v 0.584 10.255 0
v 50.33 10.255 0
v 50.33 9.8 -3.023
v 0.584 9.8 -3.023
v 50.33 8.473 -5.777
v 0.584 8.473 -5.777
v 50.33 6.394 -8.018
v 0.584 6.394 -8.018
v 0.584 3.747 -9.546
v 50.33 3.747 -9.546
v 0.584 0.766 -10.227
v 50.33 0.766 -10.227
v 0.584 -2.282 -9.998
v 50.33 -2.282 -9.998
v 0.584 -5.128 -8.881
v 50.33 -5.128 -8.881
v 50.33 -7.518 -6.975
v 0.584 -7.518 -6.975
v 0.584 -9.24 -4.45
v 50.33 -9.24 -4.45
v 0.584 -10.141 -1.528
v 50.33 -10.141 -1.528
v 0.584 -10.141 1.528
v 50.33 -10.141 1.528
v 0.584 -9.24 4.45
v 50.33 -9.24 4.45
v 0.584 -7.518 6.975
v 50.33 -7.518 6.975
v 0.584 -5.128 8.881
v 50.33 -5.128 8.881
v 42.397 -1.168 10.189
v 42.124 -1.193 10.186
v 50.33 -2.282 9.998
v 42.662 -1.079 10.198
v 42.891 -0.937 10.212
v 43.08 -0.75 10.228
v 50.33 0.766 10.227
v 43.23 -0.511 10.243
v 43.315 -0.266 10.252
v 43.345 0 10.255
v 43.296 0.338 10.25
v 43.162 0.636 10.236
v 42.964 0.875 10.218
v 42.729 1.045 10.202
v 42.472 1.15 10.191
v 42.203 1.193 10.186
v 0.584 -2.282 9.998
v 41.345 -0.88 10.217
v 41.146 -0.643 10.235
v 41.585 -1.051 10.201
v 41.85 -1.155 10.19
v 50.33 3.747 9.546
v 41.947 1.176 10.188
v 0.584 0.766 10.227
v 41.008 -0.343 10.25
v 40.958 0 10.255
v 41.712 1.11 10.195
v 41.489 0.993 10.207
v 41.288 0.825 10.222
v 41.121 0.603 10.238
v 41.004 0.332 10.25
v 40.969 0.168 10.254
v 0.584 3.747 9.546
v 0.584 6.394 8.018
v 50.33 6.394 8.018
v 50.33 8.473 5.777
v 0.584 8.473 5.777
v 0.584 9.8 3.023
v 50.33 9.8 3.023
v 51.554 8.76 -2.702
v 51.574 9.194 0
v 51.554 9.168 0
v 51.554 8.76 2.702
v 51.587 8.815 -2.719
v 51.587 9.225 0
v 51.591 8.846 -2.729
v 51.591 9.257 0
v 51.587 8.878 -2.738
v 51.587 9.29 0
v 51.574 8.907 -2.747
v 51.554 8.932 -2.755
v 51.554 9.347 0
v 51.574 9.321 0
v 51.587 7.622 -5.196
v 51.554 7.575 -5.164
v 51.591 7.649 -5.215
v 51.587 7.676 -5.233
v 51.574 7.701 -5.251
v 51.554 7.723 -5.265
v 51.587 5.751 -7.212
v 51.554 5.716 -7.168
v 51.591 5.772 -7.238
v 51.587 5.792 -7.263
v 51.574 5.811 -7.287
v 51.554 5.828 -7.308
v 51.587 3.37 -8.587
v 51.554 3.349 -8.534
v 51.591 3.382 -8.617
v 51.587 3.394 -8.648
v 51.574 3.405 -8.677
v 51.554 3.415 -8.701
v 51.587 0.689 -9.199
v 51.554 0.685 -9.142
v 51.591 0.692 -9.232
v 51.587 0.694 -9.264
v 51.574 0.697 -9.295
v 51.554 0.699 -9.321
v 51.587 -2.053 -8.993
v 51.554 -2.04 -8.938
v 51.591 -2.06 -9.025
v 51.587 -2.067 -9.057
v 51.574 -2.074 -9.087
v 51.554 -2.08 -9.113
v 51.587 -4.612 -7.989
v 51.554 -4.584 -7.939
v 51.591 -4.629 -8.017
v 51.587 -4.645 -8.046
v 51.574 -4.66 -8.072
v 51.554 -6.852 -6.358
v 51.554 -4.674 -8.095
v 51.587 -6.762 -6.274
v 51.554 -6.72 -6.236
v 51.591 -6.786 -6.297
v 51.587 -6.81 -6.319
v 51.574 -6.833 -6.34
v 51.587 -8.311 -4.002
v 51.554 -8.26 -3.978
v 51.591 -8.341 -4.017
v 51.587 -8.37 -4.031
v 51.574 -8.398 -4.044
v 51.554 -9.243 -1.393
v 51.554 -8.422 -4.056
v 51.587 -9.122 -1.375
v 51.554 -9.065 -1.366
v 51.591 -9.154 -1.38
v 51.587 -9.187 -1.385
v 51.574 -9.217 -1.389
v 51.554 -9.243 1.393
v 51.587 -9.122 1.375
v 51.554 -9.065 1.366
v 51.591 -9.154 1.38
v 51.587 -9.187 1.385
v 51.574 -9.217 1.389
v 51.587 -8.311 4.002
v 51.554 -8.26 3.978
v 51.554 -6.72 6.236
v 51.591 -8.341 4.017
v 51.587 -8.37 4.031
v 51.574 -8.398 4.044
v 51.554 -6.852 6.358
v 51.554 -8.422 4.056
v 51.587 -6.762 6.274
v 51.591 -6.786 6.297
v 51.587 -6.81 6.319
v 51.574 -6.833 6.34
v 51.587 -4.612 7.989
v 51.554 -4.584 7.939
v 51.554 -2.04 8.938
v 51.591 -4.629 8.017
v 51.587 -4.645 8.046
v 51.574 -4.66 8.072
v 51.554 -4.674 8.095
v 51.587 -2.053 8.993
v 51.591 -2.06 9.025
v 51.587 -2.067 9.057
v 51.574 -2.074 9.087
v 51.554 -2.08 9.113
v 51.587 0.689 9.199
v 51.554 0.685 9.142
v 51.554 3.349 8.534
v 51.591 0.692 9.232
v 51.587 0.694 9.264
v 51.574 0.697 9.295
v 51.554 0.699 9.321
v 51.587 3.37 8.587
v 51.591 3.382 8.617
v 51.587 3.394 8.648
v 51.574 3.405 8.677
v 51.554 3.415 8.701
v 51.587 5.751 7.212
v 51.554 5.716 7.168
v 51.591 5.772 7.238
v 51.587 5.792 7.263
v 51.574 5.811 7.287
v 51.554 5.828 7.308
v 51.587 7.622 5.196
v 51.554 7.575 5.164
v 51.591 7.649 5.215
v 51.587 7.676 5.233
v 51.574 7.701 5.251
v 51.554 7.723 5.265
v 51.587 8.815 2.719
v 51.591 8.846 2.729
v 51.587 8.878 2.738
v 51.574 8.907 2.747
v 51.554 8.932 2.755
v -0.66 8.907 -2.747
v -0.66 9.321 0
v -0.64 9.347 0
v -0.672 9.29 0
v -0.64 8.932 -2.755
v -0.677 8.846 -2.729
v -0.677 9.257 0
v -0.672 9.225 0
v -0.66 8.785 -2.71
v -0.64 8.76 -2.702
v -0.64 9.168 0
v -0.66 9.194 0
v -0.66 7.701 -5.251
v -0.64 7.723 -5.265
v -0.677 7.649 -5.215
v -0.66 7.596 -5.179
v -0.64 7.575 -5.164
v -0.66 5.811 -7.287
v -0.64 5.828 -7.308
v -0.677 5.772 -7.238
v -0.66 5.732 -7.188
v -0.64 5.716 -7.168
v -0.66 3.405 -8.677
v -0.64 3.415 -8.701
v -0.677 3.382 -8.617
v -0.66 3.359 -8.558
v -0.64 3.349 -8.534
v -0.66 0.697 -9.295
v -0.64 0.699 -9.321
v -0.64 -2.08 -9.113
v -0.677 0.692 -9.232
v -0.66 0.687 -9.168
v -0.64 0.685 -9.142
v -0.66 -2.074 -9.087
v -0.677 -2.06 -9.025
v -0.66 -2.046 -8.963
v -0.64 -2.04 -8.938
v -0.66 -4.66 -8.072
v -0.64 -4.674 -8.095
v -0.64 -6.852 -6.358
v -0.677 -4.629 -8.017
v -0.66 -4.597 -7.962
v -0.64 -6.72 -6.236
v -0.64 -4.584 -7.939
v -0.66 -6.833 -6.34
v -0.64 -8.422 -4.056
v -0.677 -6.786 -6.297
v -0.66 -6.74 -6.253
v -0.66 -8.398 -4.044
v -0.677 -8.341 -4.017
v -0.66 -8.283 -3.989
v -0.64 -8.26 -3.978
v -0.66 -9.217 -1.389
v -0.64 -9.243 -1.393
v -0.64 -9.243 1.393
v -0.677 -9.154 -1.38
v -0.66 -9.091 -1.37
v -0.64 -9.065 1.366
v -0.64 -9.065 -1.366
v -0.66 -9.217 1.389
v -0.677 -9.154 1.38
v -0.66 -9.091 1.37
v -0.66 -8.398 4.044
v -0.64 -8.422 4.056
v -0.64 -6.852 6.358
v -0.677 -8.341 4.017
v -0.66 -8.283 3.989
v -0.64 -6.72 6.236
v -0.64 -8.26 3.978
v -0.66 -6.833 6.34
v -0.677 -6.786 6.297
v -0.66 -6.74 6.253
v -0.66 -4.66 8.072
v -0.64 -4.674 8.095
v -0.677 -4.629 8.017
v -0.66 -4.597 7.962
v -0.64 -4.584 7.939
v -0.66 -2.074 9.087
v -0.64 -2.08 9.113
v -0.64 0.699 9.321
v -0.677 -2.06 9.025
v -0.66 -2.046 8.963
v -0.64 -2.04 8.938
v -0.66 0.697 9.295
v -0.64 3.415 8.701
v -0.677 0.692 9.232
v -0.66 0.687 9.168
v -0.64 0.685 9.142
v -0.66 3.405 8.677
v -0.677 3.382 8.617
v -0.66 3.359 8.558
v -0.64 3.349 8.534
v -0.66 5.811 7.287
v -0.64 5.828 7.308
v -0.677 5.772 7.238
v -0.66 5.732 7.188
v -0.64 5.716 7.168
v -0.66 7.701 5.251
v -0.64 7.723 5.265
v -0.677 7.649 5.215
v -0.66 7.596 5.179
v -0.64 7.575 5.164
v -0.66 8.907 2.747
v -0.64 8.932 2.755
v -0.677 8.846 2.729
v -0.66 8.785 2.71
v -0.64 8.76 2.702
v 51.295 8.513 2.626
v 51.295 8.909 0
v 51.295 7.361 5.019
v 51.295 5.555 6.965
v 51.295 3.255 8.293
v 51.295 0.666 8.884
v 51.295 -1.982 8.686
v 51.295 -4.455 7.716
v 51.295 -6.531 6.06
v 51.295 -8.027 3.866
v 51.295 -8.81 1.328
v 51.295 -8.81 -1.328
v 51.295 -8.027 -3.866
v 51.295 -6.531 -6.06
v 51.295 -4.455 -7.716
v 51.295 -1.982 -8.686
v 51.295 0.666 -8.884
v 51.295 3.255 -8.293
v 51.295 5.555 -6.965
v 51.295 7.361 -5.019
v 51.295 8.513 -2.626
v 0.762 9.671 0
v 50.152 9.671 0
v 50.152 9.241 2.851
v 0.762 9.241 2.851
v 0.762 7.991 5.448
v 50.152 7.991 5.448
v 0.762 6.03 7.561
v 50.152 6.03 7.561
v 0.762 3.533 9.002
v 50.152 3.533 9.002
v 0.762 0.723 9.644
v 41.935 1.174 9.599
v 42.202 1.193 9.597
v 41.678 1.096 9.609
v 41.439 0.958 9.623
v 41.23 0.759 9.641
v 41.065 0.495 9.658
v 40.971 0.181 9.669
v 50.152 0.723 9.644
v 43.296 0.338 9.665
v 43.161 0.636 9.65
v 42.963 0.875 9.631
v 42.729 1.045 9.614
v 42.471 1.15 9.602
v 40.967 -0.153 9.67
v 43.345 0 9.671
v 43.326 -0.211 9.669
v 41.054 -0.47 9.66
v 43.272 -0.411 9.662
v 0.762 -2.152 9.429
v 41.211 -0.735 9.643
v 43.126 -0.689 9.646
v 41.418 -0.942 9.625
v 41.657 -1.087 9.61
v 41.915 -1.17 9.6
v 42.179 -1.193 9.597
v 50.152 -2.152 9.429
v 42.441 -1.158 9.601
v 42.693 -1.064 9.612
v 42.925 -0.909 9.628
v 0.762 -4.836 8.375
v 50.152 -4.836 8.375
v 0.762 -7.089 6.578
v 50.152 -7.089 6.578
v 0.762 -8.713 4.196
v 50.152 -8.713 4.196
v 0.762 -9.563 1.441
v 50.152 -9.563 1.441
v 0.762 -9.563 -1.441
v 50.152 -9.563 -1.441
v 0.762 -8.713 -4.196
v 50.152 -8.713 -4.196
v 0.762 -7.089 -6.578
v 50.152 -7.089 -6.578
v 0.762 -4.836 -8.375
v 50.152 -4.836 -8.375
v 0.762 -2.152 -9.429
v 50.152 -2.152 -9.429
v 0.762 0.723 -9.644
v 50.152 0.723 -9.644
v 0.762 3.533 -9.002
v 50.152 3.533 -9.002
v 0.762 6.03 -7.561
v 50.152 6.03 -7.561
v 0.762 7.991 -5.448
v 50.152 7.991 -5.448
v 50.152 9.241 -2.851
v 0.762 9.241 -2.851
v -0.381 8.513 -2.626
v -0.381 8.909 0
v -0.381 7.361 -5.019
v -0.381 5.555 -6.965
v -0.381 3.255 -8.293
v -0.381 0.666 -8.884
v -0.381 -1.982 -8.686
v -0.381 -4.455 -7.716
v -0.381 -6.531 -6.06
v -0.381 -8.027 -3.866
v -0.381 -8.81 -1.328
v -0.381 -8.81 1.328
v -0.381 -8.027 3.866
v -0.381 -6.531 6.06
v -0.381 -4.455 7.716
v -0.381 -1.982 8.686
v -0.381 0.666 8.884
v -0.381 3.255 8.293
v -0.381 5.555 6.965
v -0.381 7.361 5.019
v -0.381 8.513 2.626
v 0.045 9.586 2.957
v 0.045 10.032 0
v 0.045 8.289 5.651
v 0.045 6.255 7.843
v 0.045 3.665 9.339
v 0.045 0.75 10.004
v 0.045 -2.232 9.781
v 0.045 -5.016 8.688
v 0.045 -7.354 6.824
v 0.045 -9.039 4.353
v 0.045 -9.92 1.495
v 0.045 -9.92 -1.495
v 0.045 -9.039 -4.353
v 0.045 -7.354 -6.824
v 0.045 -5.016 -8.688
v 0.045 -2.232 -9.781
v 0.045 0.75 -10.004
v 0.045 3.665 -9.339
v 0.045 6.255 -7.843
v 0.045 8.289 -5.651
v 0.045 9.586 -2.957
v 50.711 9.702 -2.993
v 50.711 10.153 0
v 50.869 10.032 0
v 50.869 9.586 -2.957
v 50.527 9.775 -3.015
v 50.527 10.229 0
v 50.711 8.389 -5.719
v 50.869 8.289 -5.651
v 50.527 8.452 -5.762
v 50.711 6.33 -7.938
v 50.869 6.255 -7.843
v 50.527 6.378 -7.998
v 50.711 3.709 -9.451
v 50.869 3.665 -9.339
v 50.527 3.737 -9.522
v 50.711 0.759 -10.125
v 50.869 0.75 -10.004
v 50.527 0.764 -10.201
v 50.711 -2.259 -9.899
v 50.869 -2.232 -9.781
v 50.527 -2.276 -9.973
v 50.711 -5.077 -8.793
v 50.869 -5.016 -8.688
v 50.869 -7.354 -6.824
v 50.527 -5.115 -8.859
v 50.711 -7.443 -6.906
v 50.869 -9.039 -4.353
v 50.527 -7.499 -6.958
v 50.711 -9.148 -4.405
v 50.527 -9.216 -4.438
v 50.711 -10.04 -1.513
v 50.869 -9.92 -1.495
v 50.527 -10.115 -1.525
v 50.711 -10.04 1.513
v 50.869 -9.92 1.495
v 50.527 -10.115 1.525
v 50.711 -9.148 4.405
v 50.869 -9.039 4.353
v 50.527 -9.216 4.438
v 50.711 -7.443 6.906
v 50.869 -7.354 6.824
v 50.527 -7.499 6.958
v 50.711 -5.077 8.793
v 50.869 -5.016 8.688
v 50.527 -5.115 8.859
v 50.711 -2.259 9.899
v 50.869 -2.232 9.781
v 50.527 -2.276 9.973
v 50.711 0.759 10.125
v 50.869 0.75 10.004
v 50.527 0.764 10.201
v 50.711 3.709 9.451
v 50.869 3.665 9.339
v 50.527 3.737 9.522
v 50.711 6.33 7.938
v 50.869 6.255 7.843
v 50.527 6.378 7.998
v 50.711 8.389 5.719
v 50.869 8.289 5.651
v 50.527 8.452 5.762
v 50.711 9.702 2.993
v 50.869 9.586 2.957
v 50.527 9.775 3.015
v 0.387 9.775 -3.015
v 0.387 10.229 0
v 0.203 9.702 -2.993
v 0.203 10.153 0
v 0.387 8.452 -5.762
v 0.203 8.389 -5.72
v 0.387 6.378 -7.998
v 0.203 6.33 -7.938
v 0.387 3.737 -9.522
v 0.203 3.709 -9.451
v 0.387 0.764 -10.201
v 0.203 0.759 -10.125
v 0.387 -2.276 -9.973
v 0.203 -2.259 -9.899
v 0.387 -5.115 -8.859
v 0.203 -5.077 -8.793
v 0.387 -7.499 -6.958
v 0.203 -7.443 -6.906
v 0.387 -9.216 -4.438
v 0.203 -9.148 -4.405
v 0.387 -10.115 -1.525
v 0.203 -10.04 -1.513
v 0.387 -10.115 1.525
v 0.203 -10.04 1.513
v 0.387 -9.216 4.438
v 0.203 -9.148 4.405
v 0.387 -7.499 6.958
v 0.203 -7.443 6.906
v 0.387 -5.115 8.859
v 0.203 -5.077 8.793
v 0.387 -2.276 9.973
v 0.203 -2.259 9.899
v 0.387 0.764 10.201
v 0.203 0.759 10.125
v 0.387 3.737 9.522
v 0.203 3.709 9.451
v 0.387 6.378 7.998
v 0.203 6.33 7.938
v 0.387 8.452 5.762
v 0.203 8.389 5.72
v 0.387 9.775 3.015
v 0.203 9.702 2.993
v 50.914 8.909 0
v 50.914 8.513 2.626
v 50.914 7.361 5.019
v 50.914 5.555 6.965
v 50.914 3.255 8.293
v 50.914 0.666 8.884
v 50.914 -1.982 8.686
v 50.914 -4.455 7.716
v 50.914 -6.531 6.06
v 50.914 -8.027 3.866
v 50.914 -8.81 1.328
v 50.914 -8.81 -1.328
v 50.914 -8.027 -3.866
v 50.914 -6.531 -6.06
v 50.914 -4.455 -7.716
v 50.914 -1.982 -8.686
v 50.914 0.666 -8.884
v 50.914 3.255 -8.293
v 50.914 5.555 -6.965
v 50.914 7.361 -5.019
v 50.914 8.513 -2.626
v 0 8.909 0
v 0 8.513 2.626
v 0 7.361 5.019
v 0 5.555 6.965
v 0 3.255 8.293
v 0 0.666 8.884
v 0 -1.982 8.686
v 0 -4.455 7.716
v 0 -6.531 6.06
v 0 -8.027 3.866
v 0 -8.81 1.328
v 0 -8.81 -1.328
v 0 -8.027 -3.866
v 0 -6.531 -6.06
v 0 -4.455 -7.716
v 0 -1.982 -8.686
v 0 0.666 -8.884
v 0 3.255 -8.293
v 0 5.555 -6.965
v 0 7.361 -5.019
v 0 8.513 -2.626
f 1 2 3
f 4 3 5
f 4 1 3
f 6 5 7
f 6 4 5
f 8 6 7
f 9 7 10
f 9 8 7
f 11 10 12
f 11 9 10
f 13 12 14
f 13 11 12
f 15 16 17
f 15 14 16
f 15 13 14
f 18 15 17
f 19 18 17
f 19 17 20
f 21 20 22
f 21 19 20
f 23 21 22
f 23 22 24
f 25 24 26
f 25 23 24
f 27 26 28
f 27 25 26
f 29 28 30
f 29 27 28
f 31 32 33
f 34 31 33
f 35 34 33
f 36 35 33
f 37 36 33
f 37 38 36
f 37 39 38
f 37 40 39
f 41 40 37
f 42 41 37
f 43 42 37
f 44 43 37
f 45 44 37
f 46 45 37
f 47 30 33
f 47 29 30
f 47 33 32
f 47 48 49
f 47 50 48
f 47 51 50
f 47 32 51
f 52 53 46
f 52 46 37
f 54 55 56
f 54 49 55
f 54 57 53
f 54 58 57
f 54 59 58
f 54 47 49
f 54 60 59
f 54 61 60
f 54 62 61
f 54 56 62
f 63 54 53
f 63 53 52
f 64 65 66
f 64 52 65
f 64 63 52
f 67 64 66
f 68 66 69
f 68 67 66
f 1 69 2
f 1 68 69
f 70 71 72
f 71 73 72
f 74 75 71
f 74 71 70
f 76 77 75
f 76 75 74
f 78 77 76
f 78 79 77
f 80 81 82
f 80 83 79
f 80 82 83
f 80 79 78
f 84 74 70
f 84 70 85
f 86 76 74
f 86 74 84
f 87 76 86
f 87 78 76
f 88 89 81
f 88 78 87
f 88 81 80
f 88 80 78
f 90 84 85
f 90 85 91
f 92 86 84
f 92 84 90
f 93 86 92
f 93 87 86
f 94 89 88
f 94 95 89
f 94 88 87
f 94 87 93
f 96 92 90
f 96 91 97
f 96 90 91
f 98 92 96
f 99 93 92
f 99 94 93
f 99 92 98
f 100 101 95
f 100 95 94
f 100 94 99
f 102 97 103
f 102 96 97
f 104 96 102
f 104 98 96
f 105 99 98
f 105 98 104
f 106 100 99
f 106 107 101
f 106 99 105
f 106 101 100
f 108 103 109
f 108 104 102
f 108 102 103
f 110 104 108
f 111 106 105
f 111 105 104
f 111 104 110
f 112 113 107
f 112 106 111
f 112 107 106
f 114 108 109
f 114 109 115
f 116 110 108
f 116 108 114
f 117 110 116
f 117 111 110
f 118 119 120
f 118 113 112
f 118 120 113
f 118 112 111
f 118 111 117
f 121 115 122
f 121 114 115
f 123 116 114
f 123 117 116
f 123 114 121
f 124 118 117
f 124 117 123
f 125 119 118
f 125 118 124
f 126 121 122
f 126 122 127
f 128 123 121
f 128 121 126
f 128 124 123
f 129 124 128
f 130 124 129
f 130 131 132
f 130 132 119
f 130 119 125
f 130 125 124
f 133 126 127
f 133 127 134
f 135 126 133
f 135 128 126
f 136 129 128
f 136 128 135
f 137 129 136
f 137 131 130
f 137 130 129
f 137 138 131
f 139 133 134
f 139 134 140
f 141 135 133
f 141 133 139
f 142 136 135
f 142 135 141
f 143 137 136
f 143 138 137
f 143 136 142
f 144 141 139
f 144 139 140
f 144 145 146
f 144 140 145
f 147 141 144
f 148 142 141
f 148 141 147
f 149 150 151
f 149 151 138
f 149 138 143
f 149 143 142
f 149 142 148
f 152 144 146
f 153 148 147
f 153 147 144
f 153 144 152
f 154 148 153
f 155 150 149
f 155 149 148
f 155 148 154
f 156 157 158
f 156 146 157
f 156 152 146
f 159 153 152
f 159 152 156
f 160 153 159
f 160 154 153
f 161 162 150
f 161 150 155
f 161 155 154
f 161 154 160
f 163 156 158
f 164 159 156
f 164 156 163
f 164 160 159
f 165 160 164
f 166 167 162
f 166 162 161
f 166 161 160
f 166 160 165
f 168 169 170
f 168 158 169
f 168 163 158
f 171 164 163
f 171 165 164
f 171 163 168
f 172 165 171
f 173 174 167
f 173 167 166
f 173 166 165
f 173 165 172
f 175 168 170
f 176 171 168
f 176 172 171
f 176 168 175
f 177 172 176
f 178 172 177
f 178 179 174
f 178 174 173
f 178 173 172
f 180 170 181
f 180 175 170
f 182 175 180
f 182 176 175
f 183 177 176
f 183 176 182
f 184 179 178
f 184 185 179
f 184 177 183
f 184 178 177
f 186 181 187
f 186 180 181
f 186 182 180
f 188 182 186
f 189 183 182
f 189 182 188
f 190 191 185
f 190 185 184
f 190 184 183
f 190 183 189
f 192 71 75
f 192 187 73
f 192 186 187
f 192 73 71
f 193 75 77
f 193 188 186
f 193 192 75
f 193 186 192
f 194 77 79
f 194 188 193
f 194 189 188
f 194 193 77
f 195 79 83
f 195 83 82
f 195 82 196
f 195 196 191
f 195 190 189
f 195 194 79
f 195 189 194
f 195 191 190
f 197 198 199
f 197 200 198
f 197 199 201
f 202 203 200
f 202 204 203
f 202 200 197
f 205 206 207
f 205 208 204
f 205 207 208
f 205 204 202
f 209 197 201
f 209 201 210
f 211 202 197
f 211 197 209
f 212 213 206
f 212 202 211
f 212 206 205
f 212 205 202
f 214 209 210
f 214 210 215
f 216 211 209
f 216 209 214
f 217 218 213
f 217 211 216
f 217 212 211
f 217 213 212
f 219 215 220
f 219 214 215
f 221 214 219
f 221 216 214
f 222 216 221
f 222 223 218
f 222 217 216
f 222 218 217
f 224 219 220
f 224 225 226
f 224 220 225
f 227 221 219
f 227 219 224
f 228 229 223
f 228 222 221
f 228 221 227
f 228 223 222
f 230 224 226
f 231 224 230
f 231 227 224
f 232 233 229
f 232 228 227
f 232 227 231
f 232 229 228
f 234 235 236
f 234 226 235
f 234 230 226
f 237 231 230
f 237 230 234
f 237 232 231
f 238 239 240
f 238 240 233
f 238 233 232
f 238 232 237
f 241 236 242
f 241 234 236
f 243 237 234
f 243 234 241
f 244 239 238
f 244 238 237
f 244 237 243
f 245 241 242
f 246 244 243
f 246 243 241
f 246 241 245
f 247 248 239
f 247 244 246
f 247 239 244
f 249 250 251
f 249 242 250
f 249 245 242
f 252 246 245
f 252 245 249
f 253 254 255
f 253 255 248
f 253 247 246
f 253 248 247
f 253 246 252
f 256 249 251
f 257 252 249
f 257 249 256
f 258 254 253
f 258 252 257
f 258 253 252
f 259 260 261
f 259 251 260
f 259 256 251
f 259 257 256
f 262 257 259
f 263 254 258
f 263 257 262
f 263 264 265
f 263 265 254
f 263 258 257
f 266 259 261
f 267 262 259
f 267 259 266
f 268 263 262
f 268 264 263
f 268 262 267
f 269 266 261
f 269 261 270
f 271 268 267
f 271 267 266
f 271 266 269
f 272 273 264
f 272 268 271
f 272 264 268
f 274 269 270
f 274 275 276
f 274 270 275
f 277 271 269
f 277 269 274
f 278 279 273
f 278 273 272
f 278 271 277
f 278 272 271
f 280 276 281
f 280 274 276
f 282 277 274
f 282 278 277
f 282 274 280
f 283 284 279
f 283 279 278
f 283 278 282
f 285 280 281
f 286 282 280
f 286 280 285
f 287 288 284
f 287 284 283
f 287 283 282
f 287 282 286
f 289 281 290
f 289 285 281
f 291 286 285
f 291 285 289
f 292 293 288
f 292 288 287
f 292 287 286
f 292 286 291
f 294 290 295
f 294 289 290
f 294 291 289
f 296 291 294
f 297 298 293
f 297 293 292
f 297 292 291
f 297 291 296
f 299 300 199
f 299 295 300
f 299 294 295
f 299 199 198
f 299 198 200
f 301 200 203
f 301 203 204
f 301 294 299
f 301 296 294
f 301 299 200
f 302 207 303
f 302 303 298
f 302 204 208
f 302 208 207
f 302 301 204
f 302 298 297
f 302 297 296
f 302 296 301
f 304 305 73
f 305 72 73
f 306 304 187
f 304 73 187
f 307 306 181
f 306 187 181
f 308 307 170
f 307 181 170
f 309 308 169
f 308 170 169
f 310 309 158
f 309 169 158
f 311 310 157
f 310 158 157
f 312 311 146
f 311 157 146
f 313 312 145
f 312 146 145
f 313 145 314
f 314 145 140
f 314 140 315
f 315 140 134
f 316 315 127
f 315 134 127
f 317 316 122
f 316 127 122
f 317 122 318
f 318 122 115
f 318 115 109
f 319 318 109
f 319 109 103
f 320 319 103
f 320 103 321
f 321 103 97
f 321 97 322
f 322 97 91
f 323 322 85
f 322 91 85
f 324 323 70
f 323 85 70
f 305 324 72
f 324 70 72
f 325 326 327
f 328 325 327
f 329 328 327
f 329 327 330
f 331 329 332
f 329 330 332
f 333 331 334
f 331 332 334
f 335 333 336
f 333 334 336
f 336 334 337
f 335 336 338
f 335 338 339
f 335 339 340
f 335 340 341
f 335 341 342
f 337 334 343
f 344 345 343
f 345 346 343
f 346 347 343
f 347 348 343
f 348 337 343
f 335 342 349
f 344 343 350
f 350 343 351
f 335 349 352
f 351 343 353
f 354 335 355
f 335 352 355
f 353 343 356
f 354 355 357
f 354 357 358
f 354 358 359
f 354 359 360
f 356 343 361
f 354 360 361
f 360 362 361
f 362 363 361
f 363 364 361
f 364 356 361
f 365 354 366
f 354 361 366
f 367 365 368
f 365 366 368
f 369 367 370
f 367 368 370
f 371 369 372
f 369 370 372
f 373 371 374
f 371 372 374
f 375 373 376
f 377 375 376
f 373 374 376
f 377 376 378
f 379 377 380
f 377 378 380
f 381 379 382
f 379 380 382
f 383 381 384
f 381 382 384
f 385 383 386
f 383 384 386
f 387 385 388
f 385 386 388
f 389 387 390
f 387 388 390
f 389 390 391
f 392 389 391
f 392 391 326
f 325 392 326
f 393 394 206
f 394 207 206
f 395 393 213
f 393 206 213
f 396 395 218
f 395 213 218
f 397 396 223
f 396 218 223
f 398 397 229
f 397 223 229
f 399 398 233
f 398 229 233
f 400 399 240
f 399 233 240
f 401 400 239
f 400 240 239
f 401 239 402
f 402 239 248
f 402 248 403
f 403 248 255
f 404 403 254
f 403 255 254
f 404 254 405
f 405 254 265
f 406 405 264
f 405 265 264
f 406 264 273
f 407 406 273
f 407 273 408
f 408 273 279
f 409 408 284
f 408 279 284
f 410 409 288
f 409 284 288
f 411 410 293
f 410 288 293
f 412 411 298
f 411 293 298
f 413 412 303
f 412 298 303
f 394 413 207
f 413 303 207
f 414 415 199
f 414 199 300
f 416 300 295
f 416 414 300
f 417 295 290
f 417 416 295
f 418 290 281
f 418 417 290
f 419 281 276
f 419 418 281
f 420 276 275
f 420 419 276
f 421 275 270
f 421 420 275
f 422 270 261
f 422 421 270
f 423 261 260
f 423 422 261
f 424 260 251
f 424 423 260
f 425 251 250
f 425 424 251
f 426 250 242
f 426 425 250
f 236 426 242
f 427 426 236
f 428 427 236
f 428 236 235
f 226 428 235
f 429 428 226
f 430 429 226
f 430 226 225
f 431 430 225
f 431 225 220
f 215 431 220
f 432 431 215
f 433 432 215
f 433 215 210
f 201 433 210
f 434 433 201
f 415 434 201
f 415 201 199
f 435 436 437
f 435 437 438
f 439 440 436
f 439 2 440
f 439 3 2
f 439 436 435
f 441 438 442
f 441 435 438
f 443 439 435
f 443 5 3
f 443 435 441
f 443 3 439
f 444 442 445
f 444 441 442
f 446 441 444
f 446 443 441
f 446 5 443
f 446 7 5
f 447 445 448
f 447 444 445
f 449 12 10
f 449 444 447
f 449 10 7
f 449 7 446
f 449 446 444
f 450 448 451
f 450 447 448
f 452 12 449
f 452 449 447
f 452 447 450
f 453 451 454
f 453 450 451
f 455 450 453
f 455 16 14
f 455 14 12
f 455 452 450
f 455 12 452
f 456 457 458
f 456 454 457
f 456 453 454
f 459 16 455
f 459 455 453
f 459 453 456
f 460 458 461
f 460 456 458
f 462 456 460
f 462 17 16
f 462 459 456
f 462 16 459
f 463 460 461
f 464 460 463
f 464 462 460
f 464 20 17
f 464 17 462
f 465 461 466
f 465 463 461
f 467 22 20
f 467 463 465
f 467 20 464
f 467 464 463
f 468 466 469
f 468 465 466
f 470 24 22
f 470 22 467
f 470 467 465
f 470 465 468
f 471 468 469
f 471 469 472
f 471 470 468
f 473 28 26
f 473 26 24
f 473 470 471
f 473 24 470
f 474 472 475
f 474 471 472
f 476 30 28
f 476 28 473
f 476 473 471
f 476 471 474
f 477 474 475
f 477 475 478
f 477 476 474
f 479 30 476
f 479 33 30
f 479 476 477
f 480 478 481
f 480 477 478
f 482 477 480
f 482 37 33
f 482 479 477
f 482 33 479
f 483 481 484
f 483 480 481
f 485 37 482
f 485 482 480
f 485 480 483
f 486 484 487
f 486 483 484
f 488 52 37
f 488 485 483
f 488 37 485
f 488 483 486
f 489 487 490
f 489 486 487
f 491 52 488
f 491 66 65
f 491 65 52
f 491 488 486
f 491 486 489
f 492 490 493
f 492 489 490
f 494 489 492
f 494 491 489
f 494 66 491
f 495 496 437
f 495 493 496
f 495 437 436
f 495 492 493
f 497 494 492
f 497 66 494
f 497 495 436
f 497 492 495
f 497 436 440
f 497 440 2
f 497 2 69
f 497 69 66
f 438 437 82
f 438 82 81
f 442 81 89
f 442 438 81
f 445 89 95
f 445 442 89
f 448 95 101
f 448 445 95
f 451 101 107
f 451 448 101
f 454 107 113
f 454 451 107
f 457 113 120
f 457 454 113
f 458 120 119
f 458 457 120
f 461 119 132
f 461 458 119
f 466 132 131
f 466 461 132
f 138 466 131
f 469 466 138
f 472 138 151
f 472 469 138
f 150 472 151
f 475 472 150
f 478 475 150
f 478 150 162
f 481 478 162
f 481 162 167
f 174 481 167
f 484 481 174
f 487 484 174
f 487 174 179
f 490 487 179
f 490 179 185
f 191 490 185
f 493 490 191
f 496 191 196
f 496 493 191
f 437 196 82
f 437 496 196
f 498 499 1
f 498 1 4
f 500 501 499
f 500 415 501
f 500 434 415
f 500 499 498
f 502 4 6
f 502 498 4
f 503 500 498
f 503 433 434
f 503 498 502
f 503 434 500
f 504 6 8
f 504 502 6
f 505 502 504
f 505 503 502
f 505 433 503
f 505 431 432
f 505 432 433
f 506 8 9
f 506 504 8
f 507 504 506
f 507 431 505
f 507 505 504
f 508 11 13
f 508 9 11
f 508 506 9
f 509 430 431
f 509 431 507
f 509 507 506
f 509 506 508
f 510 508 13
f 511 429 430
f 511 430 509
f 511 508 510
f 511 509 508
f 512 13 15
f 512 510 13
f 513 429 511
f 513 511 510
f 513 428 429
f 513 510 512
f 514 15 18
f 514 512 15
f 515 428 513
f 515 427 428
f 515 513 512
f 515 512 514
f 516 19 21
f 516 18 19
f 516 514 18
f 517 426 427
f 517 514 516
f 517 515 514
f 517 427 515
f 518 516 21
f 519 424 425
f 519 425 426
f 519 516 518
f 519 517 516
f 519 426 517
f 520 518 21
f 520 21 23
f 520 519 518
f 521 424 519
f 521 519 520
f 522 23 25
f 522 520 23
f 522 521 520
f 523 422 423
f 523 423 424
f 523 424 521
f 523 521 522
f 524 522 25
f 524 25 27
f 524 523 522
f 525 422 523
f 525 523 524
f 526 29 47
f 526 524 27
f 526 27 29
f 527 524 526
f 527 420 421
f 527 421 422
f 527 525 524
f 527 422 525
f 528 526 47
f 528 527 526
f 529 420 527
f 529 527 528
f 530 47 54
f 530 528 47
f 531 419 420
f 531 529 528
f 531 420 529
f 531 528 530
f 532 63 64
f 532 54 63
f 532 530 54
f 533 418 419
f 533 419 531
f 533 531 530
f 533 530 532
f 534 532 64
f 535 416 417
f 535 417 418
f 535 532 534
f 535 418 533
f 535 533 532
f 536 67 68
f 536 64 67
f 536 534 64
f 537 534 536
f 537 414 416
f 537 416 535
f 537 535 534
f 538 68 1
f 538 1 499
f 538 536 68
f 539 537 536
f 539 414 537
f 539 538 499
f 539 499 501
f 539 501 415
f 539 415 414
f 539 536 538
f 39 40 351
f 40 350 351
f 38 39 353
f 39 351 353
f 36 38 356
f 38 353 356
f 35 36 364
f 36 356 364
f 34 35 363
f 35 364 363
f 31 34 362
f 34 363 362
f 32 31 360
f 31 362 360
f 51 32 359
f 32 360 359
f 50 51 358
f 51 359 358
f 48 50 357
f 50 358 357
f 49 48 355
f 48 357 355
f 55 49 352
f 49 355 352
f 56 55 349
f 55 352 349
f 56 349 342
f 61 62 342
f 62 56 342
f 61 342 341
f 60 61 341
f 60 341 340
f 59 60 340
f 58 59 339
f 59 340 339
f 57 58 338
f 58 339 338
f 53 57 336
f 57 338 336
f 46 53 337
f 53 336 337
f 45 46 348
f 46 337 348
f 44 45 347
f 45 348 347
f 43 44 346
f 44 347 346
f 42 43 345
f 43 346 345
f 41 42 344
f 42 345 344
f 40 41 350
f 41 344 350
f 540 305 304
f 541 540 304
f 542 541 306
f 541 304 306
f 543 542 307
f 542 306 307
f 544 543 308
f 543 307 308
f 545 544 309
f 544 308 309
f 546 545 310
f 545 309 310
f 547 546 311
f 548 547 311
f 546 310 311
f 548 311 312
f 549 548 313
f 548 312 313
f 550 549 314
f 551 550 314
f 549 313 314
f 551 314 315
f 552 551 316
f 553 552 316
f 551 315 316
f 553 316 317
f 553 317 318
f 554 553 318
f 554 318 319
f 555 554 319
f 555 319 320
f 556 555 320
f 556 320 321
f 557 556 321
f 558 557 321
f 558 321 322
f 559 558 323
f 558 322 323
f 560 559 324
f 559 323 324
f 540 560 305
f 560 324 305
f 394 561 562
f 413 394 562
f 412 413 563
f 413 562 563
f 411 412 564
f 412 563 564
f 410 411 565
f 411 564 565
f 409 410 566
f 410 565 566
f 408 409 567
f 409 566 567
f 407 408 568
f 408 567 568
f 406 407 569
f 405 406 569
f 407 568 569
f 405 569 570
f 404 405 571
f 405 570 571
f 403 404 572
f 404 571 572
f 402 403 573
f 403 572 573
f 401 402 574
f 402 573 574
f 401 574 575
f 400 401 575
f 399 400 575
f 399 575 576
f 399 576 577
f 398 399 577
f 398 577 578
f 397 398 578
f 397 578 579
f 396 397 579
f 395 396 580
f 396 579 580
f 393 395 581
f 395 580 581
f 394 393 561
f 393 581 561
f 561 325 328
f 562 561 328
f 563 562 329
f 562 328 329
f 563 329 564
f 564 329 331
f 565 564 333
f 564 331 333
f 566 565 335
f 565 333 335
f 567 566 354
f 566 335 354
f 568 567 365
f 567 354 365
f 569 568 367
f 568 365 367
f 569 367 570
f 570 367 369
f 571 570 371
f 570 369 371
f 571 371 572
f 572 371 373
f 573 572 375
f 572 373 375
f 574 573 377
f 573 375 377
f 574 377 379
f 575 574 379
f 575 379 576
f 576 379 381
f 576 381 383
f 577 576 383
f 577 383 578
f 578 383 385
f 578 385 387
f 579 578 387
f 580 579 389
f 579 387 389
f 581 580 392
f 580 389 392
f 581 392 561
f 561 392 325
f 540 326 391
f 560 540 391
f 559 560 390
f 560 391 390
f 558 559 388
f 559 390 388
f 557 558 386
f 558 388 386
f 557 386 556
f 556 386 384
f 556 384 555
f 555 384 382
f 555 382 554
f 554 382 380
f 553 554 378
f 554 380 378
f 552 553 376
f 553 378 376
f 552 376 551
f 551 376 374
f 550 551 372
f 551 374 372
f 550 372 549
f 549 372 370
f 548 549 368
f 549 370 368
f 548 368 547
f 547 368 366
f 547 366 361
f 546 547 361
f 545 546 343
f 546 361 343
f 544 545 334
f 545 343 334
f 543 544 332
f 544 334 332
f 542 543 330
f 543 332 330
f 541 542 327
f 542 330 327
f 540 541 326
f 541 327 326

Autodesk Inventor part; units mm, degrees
sketch "Sketch_1" plane through (0, 0, 0) normal (0, 0, 1) x (1, 0, 0)
  line L0 (50.9143, 0) -> (0, 0)
  arc A0 (-0.6395, 9.3472) -> (-0.6395, 9.1676) centre (-0.5497, 9.2574) ccw
  line L1 (-0.6395, 9.1676) -> (-0.381, 8.9091)
  line L2 (-0.381, 8.9091) -> (0, 8.9091)
  line L3 (0, 8.9091) -> (0.762, 9.671)
  line L4 (0.762, 9.671) -> (50.1523, 9.671)
  line L5 (50.1523, 9.671) -> (50.9143, 8.9091)
  line L6 (50.9143, 8.9091) -> (51.2953, 8.9091)
  line L7 (51.2953, 8.9091) -> (51.5538, 9.1676)
  arc A1 (51.5538, 9.1676) -> (51.5538, 9.3472) centre (51.464, 9.2574) ccw
  line L8 (51.5538, 9.3472) -> (50.8689, 10.0321)
  arc A2 (50.8689, 10.0321) -> (50.3301, 10.2553) centre (50.3301, 9.4933) ccw
  line L9 (50.3301, 10.2553) -> (0.5842, 10.2553)
  arc A3 (0.5842, 10.2553) -> (0.0454, 10.0321) centre (0.5842, 9.4933) ccw
  line L10 (0.0454, 10.0321) -> (-0.6395, 9.3472)
revolve "Revolution1" add sketch "Sketch_1" angle 360 about axis through (50.9143, 0, 0) along (1, 0, 0)
sketch "Sketch_7" plane through (0, 0, 0) normal (0, 0, 1) x (1, 0, 0)
  circle A0 centre (42.1513, 0) radius 1.1938
extrude "Extrusion1" cut sketch "Sketch_7" along normal blind 10.2553
ref_plane "cp1_XY" through (25.4571, 10.2553, 0) normal (1, 0, 0) x (0, 0, -1)
ref_plane "cp1_YZ" through (25.4571, 10.2553, 0) normal (0, 0, -1) x (0, 1, 0)
ref_plane "cp1_ZX" through (25.4571, 10.2553, 0) normal (0, 1, 0) x (1, 0, 0)
ref_plane "cp2_XY" through (25.4571, 0, -10.2553) normal (1, 0, 0) x (0, 0, -1)
ref_plane "cp2_YZ" through (25.4571, 0, -10.2553) normal (0, 0, -1) x (0, 1, 0)
ref_plane "cp2_ZX" through (25.4571, 0, -10.2553) normal (0, 1, 0) x (1, 0, 0)
ref_plane "cp3_XY" through (25.4571, -10.2553, 0) normal (1, 0, 0) x (0, 0, -1)
ref_plane "cp3_YZ" through (25.4571, -10.2553, 0) normal (0, 0, -1) x (0, 1, 0)
ref_plane "cp3_ZX" through (25.4571, -10.2553, 0) normal (0, 1, 0) x (1, 0, 0)
ref_plane "cp4_XY" through (25.4571, 0, 10.2553) normal (1, 0, 0) x (0, 0, -1)
ref_plane "cp4_YZ" through (25.4571, 0, 10.2553) normal (0, 0, -1) x (0, 1, 0)
ref_plane "cp4_ZX" through (25.4571, 0, 10.2553) normal (0, 1, 0) x (1, 0, 0)
ref_plane "tube_front_XY" through (0, 0, 0) normal (1, 0, 0) x (0, 0, -1)
ref_plane "tube_front_YZ" through (0, 0, 0) normal (0, 0, -1) x (0, 1, 0)
ref_plane "tube_front_ZX" through (0, 0, 0) normal (0, 1, 0) x (1, 0, 0)
ref_plane "tube_rear_XY" through (50.9143, 0, 0) normal (1, 0, 0) x (0, 0, -1)
ref_plane "tube_rear_YZ" through (50.9143, 0, 0) normal (0, 0, -1) x (0, 1, 0)
ref_plane "tube_rear_ZX" through (50.9143, 0, 0) normal (0, 1, 0) x (1, 0, 0)
properties part number "04R-2.00453C"
